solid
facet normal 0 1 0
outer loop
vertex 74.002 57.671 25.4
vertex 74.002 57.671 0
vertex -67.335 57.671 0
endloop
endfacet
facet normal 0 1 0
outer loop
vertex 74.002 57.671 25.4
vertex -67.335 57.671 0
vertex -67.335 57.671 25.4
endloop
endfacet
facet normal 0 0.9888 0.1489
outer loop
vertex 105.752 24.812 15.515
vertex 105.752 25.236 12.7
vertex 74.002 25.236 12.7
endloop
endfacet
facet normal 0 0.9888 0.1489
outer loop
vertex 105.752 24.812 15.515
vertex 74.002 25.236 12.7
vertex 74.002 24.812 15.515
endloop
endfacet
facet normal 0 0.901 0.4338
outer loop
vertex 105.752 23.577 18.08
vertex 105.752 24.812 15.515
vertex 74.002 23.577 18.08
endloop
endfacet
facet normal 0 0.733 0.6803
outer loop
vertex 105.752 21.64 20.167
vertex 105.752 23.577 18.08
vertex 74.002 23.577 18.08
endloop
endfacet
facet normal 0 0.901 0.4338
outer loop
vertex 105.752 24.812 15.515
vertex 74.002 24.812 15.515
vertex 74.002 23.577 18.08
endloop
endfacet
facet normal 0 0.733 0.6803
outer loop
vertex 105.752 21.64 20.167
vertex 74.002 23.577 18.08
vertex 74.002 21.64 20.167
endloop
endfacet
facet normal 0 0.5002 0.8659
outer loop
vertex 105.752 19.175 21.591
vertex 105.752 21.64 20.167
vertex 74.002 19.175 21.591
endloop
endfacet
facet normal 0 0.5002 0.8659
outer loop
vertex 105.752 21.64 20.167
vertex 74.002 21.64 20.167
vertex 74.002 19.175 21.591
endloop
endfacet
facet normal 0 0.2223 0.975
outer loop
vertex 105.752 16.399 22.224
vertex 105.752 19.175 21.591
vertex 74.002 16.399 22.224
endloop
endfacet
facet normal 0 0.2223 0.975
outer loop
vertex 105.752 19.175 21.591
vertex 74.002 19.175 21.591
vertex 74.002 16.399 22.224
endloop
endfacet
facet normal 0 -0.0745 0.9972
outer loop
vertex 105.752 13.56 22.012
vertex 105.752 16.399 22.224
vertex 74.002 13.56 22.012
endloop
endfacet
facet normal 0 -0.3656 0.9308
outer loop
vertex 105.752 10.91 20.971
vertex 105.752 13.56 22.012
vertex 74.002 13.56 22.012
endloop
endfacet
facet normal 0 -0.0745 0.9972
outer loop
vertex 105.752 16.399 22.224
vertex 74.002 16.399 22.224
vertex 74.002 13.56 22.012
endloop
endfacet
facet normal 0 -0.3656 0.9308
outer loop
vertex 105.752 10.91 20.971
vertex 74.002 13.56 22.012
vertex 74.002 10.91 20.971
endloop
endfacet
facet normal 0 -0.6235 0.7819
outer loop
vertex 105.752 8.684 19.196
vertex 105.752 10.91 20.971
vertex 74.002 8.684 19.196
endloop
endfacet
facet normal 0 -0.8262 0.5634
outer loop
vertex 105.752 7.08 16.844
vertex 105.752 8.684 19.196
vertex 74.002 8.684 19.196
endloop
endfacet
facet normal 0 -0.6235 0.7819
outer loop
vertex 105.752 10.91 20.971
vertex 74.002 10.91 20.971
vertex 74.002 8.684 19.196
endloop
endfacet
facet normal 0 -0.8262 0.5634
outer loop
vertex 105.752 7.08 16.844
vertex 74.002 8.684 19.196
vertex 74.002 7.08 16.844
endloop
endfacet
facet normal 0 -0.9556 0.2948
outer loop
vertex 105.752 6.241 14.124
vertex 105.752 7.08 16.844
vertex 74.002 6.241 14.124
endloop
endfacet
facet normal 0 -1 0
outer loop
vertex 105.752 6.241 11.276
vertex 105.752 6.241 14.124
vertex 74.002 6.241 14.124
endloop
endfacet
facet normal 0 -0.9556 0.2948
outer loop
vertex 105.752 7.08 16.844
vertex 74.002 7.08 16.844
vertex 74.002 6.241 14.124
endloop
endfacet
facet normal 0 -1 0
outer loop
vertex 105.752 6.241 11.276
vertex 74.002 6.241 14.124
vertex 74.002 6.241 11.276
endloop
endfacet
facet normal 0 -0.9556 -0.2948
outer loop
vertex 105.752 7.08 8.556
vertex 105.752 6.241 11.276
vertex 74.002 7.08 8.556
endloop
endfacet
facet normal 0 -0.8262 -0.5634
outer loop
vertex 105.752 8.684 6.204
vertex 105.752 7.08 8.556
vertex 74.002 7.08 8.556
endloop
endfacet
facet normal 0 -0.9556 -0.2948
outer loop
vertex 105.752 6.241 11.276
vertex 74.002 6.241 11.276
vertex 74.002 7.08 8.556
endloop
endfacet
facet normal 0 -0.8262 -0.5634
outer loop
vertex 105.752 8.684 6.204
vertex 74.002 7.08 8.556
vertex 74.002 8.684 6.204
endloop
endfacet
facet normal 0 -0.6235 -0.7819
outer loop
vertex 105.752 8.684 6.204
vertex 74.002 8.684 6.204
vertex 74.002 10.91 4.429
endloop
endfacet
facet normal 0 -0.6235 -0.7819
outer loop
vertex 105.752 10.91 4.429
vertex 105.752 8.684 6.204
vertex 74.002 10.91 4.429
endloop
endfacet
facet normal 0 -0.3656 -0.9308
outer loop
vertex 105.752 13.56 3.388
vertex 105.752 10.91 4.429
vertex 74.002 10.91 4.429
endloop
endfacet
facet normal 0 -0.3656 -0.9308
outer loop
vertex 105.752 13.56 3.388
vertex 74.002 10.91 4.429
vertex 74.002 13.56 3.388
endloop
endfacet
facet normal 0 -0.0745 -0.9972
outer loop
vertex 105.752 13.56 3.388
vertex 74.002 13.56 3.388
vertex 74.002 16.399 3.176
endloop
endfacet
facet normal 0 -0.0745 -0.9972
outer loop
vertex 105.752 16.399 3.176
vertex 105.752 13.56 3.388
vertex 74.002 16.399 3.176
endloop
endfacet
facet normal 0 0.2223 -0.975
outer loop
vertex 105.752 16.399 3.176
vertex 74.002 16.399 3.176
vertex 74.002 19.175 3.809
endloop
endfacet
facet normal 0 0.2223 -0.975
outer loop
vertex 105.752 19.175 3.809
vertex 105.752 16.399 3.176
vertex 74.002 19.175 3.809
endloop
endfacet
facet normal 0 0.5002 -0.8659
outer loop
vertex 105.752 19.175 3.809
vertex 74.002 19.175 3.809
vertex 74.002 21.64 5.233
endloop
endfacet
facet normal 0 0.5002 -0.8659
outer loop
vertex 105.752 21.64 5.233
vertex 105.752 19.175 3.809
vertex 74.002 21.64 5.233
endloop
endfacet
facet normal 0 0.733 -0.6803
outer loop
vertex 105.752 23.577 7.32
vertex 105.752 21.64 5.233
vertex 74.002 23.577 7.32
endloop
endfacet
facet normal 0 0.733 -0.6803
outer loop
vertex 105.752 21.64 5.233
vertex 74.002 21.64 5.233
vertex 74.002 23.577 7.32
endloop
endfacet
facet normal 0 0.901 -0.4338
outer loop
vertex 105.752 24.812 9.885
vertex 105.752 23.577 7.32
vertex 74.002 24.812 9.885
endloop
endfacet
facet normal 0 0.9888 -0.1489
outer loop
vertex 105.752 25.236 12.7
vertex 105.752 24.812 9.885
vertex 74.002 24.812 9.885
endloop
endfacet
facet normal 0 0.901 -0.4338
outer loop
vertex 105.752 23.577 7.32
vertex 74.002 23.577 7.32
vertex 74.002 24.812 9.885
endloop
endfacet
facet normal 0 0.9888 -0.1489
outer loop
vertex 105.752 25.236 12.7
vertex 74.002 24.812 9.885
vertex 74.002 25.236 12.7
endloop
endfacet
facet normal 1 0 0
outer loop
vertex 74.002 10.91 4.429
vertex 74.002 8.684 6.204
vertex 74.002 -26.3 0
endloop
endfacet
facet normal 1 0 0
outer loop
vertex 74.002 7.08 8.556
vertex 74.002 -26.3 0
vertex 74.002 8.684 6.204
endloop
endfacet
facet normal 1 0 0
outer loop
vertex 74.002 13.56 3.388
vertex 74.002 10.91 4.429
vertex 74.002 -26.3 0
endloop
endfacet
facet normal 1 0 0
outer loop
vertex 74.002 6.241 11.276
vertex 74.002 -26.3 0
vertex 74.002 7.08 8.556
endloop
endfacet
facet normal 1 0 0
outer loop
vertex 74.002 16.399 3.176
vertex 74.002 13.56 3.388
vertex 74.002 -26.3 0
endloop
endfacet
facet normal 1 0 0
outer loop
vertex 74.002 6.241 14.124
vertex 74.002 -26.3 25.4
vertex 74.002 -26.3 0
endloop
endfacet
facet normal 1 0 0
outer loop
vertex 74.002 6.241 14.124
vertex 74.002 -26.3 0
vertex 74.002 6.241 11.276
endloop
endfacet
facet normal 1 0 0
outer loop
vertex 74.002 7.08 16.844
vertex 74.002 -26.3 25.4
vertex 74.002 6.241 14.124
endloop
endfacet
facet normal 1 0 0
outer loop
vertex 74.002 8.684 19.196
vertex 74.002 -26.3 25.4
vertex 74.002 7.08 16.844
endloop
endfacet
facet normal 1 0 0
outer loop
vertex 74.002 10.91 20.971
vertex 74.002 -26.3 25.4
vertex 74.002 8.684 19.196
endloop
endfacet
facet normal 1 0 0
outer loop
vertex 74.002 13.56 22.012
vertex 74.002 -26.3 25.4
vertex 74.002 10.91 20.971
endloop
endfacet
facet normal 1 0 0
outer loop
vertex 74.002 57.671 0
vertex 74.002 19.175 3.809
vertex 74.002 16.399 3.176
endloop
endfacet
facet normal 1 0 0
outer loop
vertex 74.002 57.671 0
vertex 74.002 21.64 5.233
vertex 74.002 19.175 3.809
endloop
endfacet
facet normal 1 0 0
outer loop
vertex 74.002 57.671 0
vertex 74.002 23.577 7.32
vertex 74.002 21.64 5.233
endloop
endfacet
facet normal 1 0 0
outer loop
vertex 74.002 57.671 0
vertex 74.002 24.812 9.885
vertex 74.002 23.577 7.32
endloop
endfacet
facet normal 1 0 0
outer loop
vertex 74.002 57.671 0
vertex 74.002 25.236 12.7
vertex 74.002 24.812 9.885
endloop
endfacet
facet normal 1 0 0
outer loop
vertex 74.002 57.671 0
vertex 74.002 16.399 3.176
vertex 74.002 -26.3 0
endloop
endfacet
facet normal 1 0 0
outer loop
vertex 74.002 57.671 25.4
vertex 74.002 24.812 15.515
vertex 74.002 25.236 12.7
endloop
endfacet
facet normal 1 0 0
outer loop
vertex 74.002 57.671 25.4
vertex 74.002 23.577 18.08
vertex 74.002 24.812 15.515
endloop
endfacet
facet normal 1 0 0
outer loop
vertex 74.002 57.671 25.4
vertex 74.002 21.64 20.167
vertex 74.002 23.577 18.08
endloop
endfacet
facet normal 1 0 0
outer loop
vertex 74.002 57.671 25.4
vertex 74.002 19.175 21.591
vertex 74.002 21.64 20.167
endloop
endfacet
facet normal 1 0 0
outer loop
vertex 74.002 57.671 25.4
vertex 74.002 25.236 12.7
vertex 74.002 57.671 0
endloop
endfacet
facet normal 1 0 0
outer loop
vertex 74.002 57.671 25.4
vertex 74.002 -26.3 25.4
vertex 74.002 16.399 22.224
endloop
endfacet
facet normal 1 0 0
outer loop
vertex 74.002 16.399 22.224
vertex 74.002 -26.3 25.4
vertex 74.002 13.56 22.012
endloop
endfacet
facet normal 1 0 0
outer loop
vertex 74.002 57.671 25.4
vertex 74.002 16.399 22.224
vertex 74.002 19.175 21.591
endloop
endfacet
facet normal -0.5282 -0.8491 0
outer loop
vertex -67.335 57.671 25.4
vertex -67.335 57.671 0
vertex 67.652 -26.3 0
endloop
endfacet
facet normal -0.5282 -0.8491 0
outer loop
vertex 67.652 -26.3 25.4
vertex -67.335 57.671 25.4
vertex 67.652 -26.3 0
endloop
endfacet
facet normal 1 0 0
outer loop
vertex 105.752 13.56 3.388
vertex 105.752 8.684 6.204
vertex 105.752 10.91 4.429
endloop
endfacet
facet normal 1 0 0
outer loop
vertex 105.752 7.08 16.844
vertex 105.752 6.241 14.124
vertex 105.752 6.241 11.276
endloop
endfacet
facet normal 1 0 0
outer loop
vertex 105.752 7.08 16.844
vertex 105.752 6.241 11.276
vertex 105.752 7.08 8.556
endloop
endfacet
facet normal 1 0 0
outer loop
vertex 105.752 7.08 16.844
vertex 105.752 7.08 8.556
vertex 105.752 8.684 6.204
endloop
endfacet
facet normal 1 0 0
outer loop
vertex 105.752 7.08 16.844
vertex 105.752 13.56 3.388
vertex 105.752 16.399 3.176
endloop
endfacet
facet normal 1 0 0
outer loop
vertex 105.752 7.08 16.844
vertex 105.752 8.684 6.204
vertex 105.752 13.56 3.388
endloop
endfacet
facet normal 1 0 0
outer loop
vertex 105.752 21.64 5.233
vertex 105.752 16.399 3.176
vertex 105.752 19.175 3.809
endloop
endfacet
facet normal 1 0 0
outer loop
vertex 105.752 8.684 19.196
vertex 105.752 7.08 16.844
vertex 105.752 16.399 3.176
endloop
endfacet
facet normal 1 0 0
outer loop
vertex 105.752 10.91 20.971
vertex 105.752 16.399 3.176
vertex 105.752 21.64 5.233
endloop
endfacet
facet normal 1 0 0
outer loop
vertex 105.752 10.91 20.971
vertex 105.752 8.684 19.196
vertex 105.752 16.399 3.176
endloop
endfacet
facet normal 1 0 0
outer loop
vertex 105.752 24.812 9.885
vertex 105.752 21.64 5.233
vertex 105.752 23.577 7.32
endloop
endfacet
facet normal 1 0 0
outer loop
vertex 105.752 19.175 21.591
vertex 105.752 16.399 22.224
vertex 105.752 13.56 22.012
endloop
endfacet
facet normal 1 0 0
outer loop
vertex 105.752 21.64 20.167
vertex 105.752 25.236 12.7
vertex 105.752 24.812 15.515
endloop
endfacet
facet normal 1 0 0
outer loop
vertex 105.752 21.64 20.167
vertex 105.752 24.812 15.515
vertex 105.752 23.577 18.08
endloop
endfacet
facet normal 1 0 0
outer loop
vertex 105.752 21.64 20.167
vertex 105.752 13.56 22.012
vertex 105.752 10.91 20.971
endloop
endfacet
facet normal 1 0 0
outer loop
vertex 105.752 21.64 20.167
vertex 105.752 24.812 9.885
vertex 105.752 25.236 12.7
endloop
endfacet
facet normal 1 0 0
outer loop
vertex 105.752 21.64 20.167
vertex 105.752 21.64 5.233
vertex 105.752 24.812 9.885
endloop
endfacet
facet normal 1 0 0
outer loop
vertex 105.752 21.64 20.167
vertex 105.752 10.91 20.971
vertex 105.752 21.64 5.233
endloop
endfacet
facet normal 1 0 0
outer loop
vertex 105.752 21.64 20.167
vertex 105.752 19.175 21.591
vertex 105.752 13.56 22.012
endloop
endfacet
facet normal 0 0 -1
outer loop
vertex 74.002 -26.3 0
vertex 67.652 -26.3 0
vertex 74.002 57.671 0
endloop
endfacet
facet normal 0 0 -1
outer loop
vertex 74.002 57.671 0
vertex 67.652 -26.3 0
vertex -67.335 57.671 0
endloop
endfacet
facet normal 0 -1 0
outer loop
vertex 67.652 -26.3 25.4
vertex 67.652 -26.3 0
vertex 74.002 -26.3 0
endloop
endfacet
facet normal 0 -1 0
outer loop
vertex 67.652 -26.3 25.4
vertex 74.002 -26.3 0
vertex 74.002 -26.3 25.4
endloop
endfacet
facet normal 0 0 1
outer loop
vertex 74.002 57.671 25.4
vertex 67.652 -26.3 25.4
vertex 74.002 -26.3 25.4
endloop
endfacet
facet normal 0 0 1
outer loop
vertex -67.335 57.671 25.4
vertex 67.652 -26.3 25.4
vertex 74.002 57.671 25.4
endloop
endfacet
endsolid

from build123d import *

# Parameters (mm, degrees)
F1_DEPTH = 25.4
F2_W     = 83.970894
F2_H     = 25.4
F3_DEPTH = 6.35
F4_R     = 9.551083
F5_DEPTH = 31.75


with BuildPart() as f1:
    # F0 (on Top) → F1 (new body)
    with BuildSketch(Plane.XY):
        Polygon((67.652024, 57.670575), (-67.335151, 57.670575), (67.652024, -26.300319), align=None)
    extrude(amount=F1_DEPTH)

    # F2 (on face) → F3 (join)
    with BuildSketch(Plane.YZ.offset(67.652024)):
        with Locations((15.685128, 12.7)):
            Rectangle(F2_W, F2_H)
    extrude(amount=F3_DEPTH)

    # F4 (on face) → F5 (join)
    with BuildSketch(Plane.YZ.offset(74.002024)):
        with Locations((15.685128, 12.7)):
            Circle(F4_R)
    extrude(amount=F5_DEPTH)


solid = f1.part
